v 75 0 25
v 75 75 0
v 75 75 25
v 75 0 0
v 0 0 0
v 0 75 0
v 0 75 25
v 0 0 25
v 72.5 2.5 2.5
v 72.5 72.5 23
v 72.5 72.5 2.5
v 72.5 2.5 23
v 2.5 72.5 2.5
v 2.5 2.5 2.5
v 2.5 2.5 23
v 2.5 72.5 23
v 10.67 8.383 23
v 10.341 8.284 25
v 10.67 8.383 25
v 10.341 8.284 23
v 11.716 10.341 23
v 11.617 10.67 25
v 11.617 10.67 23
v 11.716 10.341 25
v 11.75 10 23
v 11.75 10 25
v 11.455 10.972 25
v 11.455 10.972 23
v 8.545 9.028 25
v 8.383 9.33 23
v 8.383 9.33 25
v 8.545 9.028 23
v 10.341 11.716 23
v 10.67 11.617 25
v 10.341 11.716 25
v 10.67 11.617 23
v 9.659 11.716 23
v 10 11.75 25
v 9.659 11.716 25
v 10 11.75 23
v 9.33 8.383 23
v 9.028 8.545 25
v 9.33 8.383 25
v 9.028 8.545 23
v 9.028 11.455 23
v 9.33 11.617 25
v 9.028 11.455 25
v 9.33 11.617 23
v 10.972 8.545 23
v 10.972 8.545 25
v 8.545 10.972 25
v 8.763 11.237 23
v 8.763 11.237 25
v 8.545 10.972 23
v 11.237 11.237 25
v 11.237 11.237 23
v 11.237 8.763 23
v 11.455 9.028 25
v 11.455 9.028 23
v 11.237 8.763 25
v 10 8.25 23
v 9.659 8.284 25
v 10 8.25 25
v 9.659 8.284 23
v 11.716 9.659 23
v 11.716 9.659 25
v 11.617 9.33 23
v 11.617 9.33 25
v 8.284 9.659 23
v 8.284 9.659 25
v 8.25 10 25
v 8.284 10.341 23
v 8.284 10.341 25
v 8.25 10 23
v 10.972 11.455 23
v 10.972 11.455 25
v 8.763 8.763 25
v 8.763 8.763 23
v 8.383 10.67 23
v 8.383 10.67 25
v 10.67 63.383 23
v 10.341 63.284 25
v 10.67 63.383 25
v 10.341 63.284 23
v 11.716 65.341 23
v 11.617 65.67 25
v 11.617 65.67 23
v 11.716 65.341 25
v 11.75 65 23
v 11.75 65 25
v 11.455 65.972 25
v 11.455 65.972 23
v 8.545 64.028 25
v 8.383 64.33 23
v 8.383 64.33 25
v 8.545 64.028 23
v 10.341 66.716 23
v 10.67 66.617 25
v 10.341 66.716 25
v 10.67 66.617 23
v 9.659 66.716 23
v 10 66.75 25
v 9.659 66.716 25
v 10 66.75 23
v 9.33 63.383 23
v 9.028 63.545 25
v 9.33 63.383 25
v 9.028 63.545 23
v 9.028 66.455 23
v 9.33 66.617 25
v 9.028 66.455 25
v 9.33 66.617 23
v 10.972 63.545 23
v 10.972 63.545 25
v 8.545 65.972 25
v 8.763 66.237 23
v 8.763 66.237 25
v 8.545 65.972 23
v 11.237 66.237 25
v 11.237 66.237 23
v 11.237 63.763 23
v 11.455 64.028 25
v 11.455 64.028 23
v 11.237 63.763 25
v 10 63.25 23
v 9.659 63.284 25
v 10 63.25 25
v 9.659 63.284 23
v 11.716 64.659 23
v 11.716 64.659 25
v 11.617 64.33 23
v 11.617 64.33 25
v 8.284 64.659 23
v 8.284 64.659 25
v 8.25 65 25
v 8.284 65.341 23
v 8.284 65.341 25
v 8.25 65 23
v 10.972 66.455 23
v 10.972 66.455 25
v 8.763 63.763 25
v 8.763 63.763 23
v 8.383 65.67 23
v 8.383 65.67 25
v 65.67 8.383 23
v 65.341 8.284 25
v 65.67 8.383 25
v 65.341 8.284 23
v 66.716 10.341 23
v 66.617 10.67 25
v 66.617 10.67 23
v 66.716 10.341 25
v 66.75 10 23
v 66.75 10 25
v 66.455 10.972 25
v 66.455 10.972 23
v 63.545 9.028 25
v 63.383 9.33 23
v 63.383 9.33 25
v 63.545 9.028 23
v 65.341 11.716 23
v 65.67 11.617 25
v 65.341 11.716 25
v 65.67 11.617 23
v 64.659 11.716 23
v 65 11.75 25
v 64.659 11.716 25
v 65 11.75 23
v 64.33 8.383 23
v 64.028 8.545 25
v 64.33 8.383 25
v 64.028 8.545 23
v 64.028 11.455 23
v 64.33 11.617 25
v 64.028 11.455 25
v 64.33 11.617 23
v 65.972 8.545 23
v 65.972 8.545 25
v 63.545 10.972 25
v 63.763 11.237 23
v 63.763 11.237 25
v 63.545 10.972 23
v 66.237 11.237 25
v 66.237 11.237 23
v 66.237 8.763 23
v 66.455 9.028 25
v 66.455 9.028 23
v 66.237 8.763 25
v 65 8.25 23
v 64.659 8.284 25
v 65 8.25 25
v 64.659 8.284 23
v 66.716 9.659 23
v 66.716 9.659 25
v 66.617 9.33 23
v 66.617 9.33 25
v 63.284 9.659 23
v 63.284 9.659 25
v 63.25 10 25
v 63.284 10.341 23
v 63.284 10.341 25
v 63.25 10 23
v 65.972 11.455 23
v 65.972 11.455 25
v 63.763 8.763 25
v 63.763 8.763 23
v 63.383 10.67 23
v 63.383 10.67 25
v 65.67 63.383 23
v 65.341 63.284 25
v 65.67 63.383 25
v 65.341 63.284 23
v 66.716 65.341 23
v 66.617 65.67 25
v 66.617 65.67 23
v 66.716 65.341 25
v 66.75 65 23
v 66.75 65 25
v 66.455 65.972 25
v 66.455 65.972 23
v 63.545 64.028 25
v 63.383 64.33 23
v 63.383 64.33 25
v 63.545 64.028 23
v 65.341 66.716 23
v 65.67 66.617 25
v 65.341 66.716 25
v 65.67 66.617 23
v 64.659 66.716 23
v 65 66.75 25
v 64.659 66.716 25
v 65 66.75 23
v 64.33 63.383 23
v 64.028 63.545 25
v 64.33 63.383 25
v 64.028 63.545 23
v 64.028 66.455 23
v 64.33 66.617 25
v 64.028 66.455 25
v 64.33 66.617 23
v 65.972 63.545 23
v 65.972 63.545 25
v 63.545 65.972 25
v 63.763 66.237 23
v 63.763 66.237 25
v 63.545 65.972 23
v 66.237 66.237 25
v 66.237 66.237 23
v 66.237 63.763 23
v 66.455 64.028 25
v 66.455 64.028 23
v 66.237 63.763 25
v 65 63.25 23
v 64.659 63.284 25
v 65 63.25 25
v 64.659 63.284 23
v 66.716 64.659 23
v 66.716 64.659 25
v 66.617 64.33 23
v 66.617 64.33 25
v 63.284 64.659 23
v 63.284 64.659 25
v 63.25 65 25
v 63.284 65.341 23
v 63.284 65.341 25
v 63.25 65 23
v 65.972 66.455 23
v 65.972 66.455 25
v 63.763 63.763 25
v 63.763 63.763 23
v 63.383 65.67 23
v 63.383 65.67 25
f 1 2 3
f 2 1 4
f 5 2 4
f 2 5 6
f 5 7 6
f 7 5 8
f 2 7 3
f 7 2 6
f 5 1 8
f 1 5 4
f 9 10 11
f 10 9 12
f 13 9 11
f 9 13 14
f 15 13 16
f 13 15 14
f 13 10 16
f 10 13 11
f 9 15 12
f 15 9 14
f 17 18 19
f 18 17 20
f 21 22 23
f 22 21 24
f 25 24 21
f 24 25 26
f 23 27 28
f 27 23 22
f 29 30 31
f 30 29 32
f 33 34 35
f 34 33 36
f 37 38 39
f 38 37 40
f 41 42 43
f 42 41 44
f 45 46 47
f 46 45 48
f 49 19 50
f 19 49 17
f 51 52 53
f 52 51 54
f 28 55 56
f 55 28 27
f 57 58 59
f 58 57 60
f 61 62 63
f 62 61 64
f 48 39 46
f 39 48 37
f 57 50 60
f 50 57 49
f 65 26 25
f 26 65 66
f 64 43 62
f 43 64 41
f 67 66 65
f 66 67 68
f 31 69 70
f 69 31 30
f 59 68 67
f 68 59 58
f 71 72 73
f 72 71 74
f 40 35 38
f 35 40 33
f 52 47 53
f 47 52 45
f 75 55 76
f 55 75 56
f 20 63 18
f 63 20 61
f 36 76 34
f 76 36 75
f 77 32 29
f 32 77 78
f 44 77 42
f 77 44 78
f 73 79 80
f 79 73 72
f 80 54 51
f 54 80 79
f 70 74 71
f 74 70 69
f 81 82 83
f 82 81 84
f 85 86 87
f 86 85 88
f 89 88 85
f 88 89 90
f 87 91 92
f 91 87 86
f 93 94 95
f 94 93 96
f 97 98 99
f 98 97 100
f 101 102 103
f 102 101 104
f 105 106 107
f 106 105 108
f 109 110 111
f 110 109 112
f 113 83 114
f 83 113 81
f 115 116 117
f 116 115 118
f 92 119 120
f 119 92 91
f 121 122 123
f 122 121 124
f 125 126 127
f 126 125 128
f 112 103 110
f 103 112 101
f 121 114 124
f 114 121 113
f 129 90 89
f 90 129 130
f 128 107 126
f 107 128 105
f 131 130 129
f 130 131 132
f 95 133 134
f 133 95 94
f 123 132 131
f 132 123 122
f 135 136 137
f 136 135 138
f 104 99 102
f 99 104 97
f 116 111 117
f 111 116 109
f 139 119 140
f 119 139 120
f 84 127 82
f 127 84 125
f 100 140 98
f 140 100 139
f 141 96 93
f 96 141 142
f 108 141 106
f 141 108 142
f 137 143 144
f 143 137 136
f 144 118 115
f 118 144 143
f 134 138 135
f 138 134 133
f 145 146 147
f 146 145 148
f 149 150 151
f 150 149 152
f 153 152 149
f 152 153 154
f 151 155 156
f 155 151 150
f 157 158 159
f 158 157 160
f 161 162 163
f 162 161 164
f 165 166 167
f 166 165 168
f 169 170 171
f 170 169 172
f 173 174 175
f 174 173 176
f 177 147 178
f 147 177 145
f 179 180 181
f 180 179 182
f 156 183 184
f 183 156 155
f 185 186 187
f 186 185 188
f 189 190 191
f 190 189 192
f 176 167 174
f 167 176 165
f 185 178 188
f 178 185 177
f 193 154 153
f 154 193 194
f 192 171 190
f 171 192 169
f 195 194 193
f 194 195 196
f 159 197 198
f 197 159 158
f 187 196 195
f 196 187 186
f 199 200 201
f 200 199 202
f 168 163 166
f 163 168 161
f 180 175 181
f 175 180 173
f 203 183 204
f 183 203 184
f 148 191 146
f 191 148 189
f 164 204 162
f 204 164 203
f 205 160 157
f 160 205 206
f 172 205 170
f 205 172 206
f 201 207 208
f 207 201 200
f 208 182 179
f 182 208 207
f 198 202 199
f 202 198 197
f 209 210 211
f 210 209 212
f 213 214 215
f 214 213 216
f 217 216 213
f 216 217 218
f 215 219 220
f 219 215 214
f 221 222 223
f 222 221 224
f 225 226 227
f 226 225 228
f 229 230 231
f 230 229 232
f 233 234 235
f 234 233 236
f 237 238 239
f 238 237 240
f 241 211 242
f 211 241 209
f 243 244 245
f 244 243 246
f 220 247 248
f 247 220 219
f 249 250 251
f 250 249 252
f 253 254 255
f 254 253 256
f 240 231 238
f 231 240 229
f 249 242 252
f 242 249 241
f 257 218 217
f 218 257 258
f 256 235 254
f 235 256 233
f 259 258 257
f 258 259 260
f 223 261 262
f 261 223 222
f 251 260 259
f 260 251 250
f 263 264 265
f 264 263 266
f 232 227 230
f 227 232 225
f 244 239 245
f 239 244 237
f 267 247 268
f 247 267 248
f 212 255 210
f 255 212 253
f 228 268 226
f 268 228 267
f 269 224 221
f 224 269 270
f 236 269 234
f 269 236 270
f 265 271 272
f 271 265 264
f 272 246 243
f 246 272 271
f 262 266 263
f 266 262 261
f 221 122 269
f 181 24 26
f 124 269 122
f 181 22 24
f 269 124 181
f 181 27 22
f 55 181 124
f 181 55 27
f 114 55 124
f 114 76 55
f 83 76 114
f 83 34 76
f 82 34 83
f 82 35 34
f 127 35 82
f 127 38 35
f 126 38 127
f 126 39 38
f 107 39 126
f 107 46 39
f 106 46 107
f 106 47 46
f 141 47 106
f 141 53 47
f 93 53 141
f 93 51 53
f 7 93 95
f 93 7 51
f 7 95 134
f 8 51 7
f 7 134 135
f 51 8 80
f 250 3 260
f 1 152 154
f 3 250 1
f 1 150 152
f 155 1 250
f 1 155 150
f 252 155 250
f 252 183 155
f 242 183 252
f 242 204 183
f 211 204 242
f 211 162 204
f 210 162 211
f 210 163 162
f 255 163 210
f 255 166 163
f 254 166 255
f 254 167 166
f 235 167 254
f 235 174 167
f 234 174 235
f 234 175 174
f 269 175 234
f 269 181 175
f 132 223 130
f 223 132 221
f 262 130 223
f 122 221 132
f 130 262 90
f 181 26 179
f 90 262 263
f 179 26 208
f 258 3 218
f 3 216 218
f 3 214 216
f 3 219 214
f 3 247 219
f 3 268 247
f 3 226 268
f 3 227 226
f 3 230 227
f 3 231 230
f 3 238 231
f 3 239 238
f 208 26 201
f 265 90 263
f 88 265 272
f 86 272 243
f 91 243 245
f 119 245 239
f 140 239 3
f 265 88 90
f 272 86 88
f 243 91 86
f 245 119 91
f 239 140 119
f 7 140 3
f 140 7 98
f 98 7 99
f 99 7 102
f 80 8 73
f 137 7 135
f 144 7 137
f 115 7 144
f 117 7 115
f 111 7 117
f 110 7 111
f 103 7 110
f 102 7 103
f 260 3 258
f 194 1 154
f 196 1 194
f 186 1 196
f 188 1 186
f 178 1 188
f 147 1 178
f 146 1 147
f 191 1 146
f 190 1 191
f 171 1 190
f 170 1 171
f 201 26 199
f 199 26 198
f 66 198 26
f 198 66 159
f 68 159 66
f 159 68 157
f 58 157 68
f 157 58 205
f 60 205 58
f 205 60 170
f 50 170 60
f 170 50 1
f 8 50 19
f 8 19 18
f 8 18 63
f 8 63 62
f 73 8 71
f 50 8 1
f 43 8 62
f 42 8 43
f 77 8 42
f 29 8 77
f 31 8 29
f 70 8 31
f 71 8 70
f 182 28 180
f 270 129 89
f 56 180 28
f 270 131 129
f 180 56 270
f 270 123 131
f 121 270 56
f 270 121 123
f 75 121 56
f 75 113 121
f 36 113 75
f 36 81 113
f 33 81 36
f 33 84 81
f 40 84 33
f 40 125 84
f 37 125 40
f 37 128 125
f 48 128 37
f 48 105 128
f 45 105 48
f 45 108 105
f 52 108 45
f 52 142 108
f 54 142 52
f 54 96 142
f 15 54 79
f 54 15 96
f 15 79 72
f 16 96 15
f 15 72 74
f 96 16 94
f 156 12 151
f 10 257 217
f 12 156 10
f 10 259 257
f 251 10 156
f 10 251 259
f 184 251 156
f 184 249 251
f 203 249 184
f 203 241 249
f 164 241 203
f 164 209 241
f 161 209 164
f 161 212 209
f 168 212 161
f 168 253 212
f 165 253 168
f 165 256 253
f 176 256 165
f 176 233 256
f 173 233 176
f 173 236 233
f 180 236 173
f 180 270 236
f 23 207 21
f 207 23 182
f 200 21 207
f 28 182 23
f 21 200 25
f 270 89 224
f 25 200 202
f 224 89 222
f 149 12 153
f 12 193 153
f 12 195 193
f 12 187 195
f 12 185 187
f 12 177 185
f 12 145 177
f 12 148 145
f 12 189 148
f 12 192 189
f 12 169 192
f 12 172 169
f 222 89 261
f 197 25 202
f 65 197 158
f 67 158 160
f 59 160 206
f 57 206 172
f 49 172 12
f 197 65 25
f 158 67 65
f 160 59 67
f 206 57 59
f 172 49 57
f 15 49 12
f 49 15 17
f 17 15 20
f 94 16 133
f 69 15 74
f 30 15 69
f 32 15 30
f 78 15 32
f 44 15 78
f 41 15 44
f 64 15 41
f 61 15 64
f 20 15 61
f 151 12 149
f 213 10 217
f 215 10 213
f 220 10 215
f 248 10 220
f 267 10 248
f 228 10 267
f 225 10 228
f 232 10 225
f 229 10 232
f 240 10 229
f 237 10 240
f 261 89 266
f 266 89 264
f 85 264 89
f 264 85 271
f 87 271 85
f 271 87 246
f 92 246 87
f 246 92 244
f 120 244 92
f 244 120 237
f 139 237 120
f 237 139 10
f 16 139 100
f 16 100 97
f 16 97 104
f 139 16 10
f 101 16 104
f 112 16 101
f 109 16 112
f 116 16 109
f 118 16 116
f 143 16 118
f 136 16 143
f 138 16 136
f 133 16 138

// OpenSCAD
// Two-part enclosure with M3 heat-set inserts
$fn = 32;

// Enclosure dimensions
ext_x = 75;
ext_y = 75;
cav_x = 70;
cav_y = 70;
wall = 2.5;

// Base: 14 mm total (2.5 mm bottom wall + 11.5 mm cavity)
base_h = 14;
base_cav_h = base_h - wall;

// Lid: 11 mm total (2 mm top wall + 9 mm cavity)
// Combined cavity depth: 11.5 + 9 = 20.5 mm
lid_h = 11;
lid_top_thick = 2;
lid_cav_h = lid_h - lid_top_thick;

// M3 fastener positions (10 mm inset from edges)
screw_pos = [
  [10, 10],
  [10, 65],
  [65, 10],
  [65, 65]
];

screw_clear_d = 3.5;      // M3 screw clearance hole
insert_bore_d = 5;        // M3 heat-set insert bore
insert_depth = 5;         // Insert embedding depth

module base() {
  difference() {
    cube([ext_x, ext_y, base_h], center = false);
    
    // Internal cavity
    translate([wall, wall, wall])
      cube([cav_x, cav_y, base_cav_h], center = false);
    
    // Heat-set insert bores (5 mm deep from top)
    for (pos = screw_pos) {
      translate([pos[0], pos[1], base_h - insert_depth])
        cylinder(d = insert_bore_d, h = insert_depth + 1, center = false);
    }
  }
}

module lid() {
  difference() {
    cube([ext_x, ext_y, lid_h], center = false);
    
    // Internal cavity (9 mm deep)
    translate([wall, wall, 0])
      cube([cav_x, cav_y, lid_cav_h], center = false);
    
    // M3 clearance holes (3.5 mm diameter)
    for (pos = screw_pos) {
      translate([pos[0], pos[1], -1])
        cylinder(d = screw_clear_d, h = lid_h + 2, center = false);
    }
  }
}

// Render base and lid in assembled position
base();
translate([0, 0, base_h])
  lid();
